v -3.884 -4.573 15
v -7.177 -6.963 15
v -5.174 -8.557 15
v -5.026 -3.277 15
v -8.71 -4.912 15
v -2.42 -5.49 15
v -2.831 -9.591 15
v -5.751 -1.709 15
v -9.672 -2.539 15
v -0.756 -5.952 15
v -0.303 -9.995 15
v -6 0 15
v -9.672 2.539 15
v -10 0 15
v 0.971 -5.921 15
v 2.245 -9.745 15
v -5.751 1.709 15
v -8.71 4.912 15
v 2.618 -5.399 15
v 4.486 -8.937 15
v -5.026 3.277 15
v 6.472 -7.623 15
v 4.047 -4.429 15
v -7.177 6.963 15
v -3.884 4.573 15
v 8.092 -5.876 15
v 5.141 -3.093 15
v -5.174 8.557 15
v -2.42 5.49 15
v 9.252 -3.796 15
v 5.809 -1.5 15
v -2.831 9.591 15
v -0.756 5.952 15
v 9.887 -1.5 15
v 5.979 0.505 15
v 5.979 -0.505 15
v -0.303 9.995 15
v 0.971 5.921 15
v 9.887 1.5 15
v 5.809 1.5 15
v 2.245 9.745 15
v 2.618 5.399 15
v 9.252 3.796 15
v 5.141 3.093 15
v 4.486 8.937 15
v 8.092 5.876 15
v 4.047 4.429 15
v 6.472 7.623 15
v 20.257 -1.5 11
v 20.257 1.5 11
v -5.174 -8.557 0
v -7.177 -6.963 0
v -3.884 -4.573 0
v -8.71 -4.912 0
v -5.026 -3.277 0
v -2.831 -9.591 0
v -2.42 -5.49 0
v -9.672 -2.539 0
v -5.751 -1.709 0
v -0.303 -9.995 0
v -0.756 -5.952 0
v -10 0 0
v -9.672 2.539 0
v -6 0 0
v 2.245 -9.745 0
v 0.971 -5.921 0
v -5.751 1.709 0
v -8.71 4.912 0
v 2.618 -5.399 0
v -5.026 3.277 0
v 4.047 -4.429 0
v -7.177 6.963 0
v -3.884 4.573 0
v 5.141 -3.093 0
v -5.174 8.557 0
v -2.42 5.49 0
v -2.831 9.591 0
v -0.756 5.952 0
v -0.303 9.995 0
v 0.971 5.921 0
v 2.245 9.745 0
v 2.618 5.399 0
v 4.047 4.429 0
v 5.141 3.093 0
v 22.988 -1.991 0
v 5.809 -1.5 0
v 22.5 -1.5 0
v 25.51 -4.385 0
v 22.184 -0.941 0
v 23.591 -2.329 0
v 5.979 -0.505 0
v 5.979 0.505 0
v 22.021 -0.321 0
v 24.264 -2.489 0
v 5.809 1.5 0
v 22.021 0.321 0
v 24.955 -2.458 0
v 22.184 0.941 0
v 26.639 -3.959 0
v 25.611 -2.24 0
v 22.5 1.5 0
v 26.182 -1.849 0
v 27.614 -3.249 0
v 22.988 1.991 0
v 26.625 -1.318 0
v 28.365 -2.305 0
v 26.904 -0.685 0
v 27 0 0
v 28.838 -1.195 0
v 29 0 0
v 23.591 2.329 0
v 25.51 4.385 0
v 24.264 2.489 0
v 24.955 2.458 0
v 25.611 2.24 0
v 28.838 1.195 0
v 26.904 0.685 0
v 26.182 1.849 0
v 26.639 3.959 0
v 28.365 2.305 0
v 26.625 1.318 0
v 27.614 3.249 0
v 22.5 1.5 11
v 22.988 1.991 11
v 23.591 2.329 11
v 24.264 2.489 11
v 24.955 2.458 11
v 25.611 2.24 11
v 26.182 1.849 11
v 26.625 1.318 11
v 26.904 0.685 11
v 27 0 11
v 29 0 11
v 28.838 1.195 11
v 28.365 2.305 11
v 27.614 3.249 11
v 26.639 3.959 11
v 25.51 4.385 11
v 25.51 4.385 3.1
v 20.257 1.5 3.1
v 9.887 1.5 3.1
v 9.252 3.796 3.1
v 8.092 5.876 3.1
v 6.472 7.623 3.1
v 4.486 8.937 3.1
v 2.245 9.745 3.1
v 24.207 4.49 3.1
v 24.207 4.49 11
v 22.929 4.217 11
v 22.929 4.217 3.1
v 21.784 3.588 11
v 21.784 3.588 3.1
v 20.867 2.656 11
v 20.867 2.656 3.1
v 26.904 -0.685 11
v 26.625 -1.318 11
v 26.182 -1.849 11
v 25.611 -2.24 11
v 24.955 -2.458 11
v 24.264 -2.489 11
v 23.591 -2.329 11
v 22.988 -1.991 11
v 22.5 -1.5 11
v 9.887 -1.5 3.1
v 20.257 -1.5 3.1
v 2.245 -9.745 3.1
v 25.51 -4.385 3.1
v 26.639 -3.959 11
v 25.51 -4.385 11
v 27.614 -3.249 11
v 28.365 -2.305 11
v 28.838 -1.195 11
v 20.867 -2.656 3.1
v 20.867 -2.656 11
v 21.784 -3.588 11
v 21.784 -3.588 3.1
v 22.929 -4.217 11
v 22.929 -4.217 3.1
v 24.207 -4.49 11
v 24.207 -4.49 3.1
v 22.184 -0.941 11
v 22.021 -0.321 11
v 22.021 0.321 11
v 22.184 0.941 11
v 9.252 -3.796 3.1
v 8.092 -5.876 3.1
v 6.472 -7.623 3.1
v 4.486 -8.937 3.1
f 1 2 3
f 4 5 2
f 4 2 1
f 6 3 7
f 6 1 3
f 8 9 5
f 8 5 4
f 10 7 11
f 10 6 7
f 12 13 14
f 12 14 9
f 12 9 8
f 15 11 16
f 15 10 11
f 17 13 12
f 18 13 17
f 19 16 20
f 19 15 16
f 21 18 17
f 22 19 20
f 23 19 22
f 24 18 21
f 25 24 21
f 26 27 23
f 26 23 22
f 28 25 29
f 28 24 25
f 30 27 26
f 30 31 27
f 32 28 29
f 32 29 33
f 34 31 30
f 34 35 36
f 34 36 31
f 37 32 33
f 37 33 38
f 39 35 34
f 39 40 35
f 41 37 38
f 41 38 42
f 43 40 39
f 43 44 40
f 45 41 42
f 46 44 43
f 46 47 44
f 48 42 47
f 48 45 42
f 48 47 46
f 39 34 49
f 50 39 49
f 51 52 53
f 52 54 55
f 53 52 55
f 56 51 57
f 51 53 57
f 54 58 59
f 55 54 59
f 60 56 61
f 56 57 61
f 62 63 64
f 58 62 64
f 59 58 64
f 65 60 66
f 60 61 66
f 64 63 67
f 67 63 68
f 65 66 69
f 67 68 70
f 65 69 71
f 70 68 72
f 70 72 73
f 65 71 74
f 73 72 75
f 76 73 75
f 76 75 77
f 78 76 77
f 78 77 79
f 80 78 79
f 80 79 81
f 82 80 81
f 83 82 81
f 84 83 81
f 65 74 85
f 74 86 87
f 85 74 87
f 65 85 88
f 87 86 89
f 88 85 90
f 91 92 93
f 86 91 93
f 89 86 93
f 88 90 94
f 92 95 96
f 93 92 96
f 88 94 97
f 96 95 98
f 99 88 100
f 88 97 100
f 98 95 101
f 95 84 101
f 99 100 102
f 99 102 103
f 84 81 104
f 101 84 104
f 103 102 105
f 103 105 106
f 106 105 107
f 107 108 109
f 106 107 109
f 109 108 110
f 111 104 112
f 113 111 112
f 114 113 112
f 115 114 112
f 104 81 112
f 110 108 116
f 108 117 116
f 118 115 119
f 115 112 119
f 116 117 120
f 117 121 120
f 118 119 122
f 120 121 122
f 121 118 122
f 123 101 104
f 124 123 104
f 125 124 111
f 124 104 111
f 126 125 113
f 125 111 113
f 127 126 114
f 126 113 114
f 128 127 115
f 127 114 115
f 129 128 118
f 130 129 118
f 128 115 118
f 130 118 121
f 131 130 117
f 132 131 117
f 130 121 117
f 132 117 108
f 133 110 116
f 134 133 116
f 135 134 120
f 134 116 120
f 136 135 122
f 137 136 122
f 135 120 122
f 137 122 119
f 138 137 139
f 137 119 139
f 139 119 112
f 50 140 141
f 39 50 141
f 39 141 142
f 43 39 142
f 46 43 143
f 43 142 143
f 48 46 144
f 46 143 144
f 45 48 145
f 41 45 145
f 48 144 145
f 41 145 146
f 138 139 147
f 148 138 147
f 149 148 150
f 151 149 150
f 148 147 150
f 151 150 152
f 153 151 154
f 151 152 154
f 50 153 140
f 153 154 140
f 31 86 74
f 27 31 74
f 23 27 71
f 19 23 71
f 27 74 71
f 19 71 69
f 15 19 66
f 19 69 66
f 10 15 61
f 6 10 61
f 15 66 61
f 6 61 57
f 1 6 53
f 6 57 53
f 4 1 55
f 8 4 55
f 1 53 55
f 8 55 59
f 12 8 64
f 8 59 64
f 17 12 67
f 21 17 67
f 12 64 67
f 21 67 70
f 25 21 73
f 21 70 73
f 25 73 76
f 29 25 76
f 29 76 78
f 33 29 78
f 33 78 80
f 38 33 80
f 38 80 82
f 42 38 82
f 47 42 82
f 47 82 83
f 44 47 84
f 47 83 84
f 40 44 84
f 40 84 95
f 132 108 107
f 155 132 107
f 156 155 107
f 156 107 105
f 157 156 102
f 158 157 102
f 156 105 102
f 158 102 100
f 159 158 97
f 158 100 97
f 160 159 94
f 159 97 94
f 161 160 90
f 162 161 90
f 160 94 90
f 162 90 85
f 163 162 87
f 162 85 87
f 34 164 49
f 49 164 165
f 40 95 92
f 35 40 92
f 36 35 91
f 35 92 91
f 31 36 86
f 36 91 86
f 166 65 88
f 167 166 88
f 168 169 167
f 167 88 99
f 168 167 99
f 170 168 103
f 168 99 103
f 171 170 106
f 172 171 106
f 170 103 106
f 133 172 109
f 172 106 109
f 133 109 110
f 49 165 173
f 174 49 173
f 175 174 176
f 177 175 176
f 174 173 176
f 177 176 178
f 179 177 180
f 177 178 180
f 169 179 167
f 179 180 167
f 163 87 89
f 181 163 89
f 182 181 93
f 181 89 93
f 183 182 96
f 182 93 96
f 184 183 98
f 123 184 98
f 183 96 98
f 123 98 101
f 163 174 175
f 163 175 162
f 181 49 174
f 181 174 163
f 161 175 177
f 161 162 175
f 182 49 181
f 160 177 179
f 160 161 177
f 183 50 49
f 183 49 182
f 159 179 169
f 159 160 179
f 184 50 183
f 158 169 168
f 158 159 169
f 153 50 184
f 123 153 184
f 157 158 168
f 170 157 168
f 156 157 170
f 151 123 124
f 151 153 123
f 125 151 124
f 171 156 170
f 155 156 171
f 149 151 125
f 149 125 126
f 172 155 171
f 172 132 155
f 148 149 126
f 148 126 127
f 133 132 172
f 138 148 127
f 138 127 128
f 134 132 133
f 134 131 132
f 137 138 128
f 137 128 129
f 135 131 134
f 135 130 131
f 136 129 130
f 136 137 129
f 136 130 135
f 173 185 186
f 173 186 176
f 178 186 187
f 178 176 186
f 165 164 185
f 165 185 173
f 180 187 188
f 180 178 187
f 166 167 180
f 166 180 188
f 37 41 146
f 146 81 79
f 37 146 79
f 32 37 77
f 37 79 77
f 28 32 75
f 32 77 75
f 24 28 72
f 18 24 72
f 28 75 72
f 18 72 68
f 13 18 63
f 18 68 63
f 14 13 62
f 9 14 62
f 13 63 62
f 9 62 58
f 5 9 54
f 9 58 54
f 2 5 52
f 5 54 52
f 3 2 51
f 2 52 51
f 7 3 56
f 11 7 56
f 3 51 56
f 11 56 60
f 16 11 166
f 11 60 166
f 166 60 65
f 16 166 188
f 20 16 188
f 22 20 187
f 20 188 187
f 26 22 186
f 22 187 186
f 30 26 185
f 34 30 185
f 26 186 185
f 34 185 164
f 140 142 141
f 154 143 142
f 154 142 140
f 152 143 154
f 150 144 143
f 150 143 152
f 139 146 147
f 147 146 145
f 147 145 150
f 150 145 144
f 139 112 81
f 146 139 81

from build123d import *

# Parameters (mm, degrees)
F1_DEPTH = 15
F2_DEPTH = 15
F3_DEPTH = 11
F4_DEPTH = 3.1
F6_DEPTH = 3


with BuildPart() as f1:
    # F0 (on Top) → F1 (new body)
    with BuildSketch(Plane.XY):
        with BuildLine():
            ThreePointArc((9.8868599666, 1.5), (7.3340931671, 6.7978730068), (2.2448979592, 9.744764397))
            ThreePointArc((2.2448979592, 9.744764397), (-10, 0), (2.2448979592, -9.744764397))
            ThreePointArc((2.2448979592, -9.744764397), (7.3340931671, -6.7978730068), (9.8868599666, -1.5))
            Line((9.8868599666, -1.5), (5.8094750193, -1.5))
            ThreePointArc((5.8094750193, -1.5), (-6, 0), (5.8094750193, 1.5))
            Line((5.8094750193, 1.5), (9.8868599666, 1.5))
        make_face()
        with BuildLine():
            ThreePointArc((10, 0), (9.971674876, 0.7521304187), (9.8868599666, 1.5))
            Line((9.8868599666, 1.5), (5.8094750193, 1.5))
            ThreePointArc((5.8094750193, 1.5), (5.9521781776, 0.7560257549), (6, 0))
            ThreePointArc((6, 0), (5.9521781776, -0.7560257549), (5.8094750193, -1.5))
            Line((5.8094750193, -1.5), (9.8868599666, -1.5))
            ThreePointArc((9.8868599666, -1.5), (9.971674876, -0.7521304187), (10, 0))
        make_face()
    extrude(amount=F1_DEPTH)

    # F0 (on Top) → F2 (join)
    with BuildSketch(Plane.XY):
        with BuildLine():
            Line((20.2573593129, 1.5), (9.8868599666, 1.5))
            ThreePointArc((9.8868599666, 1.5), (9.971674876, 0.7521304187), (10, 0))
            ThreePointArc((10, 0), (9.971674876, -0.7521304187), (9.8868599666, -1.5))
            Line((9.8868599666, -1.5), (20.2573593129, -1.5))
            ThreePointArc((20.2573593129, -1.5), (20, 0), (20.2573593129, 1.5))
        make_face()
        with BuildLine():
            Line((22.5, 1.5), (20.2573593129, 1.5))
            ThreePointArc((20.2573593129, 1.5), (20, 0), (20.2573593129, -1.5))
            Line((20.2573593129, -1.5), (22.5, -1.5))
            ThreePointArc((22.5, -1.5), (22, 0), (22.5, 1.5))
        make_face()
    extrude(amount=F2_DEPTH)

    # F0 (on Top) → F3 (join)
    with BuildSketch(Plane.XY):
        with BuildLine():
            ThreePointArc((29, 0), (28.021073584, 2.8021493208), (25.5102040816, 4.3851439786))
            ThreePointArc((25.5102040816, 4.3851439786), (22.3336261757, 3.9442140476), (20.2573593129, 1.5))
            Line((20.2573593129, 1.5), (22.5, 1.5))
            ThreePointArc((22.5, 1.5), (25.290569415, 2.3717082451), (27, 0))
            ThreePointArc((27, 0), (25.290569415, -2.3717082451), (22.5, -1.5))
            Line((22.5, -1.5), (20.2573593129, -1.5))
            ThreePointArc((20.2573593129, -1.5), (22.3336261757, -3.9442140476), (25.5102040816, -4.3851439786))
            ThreePointArc((25.5102040816, -4.3851439786), (28.021073584, -2.8021493208), (29, 0))
        make_face()
    extrude(amount=F3_DEPTH)

    # F0 (on Top) → F4 (join)
    with BuildSketch(Plane.XY):
        with BuildLine():
            ThreePointArc((9.8868599666, -1.5), (7.3340931671, -6.7978730068), (2.2448979592, -9.744764397))
            Line((2.2448979592, -9.744764397), (25.5102040816, -4.3851439786))
            ThreePointArc((25.5102040816, -4.3851439786), (22.3336261757, -3.9442140476), (20.2573593129, -1.5))
            Line((20.2573593129, -1.5), (9.8868599666, -1.5))
        make_face()
        with BuildLine():
            Line((25.5102040816, 4.3851439786), (2.2448979592, 9.744764397))
            ThreePointArc((2.2448979592, 9.744764397), (7.3340931671, 6.7978730068), (9.8868599666, 1.5))
            Line((9.8868599666, 1.5), (20.2573593129, 1.5))
            ThreePointArc((20.2573593129, 1.5), (22.3336261757, 3.9442140476), (25.5102040816, 4.3851439786))
        make_face()
    extrude(amount=F4_DEPTH)

    # F5 (on face) → F6 (cut, through all)
    with BuildSketch(Plane.XZ.offset(1.5)):
        Polygon((22.5, 15), (9.8868599666, 15), (20.2573593129, 11), (22.5, 11), align=None)
    extrude(amount=-F6_DEPTH, mode=Mode.SUBTRACT)


solid = f1.part
